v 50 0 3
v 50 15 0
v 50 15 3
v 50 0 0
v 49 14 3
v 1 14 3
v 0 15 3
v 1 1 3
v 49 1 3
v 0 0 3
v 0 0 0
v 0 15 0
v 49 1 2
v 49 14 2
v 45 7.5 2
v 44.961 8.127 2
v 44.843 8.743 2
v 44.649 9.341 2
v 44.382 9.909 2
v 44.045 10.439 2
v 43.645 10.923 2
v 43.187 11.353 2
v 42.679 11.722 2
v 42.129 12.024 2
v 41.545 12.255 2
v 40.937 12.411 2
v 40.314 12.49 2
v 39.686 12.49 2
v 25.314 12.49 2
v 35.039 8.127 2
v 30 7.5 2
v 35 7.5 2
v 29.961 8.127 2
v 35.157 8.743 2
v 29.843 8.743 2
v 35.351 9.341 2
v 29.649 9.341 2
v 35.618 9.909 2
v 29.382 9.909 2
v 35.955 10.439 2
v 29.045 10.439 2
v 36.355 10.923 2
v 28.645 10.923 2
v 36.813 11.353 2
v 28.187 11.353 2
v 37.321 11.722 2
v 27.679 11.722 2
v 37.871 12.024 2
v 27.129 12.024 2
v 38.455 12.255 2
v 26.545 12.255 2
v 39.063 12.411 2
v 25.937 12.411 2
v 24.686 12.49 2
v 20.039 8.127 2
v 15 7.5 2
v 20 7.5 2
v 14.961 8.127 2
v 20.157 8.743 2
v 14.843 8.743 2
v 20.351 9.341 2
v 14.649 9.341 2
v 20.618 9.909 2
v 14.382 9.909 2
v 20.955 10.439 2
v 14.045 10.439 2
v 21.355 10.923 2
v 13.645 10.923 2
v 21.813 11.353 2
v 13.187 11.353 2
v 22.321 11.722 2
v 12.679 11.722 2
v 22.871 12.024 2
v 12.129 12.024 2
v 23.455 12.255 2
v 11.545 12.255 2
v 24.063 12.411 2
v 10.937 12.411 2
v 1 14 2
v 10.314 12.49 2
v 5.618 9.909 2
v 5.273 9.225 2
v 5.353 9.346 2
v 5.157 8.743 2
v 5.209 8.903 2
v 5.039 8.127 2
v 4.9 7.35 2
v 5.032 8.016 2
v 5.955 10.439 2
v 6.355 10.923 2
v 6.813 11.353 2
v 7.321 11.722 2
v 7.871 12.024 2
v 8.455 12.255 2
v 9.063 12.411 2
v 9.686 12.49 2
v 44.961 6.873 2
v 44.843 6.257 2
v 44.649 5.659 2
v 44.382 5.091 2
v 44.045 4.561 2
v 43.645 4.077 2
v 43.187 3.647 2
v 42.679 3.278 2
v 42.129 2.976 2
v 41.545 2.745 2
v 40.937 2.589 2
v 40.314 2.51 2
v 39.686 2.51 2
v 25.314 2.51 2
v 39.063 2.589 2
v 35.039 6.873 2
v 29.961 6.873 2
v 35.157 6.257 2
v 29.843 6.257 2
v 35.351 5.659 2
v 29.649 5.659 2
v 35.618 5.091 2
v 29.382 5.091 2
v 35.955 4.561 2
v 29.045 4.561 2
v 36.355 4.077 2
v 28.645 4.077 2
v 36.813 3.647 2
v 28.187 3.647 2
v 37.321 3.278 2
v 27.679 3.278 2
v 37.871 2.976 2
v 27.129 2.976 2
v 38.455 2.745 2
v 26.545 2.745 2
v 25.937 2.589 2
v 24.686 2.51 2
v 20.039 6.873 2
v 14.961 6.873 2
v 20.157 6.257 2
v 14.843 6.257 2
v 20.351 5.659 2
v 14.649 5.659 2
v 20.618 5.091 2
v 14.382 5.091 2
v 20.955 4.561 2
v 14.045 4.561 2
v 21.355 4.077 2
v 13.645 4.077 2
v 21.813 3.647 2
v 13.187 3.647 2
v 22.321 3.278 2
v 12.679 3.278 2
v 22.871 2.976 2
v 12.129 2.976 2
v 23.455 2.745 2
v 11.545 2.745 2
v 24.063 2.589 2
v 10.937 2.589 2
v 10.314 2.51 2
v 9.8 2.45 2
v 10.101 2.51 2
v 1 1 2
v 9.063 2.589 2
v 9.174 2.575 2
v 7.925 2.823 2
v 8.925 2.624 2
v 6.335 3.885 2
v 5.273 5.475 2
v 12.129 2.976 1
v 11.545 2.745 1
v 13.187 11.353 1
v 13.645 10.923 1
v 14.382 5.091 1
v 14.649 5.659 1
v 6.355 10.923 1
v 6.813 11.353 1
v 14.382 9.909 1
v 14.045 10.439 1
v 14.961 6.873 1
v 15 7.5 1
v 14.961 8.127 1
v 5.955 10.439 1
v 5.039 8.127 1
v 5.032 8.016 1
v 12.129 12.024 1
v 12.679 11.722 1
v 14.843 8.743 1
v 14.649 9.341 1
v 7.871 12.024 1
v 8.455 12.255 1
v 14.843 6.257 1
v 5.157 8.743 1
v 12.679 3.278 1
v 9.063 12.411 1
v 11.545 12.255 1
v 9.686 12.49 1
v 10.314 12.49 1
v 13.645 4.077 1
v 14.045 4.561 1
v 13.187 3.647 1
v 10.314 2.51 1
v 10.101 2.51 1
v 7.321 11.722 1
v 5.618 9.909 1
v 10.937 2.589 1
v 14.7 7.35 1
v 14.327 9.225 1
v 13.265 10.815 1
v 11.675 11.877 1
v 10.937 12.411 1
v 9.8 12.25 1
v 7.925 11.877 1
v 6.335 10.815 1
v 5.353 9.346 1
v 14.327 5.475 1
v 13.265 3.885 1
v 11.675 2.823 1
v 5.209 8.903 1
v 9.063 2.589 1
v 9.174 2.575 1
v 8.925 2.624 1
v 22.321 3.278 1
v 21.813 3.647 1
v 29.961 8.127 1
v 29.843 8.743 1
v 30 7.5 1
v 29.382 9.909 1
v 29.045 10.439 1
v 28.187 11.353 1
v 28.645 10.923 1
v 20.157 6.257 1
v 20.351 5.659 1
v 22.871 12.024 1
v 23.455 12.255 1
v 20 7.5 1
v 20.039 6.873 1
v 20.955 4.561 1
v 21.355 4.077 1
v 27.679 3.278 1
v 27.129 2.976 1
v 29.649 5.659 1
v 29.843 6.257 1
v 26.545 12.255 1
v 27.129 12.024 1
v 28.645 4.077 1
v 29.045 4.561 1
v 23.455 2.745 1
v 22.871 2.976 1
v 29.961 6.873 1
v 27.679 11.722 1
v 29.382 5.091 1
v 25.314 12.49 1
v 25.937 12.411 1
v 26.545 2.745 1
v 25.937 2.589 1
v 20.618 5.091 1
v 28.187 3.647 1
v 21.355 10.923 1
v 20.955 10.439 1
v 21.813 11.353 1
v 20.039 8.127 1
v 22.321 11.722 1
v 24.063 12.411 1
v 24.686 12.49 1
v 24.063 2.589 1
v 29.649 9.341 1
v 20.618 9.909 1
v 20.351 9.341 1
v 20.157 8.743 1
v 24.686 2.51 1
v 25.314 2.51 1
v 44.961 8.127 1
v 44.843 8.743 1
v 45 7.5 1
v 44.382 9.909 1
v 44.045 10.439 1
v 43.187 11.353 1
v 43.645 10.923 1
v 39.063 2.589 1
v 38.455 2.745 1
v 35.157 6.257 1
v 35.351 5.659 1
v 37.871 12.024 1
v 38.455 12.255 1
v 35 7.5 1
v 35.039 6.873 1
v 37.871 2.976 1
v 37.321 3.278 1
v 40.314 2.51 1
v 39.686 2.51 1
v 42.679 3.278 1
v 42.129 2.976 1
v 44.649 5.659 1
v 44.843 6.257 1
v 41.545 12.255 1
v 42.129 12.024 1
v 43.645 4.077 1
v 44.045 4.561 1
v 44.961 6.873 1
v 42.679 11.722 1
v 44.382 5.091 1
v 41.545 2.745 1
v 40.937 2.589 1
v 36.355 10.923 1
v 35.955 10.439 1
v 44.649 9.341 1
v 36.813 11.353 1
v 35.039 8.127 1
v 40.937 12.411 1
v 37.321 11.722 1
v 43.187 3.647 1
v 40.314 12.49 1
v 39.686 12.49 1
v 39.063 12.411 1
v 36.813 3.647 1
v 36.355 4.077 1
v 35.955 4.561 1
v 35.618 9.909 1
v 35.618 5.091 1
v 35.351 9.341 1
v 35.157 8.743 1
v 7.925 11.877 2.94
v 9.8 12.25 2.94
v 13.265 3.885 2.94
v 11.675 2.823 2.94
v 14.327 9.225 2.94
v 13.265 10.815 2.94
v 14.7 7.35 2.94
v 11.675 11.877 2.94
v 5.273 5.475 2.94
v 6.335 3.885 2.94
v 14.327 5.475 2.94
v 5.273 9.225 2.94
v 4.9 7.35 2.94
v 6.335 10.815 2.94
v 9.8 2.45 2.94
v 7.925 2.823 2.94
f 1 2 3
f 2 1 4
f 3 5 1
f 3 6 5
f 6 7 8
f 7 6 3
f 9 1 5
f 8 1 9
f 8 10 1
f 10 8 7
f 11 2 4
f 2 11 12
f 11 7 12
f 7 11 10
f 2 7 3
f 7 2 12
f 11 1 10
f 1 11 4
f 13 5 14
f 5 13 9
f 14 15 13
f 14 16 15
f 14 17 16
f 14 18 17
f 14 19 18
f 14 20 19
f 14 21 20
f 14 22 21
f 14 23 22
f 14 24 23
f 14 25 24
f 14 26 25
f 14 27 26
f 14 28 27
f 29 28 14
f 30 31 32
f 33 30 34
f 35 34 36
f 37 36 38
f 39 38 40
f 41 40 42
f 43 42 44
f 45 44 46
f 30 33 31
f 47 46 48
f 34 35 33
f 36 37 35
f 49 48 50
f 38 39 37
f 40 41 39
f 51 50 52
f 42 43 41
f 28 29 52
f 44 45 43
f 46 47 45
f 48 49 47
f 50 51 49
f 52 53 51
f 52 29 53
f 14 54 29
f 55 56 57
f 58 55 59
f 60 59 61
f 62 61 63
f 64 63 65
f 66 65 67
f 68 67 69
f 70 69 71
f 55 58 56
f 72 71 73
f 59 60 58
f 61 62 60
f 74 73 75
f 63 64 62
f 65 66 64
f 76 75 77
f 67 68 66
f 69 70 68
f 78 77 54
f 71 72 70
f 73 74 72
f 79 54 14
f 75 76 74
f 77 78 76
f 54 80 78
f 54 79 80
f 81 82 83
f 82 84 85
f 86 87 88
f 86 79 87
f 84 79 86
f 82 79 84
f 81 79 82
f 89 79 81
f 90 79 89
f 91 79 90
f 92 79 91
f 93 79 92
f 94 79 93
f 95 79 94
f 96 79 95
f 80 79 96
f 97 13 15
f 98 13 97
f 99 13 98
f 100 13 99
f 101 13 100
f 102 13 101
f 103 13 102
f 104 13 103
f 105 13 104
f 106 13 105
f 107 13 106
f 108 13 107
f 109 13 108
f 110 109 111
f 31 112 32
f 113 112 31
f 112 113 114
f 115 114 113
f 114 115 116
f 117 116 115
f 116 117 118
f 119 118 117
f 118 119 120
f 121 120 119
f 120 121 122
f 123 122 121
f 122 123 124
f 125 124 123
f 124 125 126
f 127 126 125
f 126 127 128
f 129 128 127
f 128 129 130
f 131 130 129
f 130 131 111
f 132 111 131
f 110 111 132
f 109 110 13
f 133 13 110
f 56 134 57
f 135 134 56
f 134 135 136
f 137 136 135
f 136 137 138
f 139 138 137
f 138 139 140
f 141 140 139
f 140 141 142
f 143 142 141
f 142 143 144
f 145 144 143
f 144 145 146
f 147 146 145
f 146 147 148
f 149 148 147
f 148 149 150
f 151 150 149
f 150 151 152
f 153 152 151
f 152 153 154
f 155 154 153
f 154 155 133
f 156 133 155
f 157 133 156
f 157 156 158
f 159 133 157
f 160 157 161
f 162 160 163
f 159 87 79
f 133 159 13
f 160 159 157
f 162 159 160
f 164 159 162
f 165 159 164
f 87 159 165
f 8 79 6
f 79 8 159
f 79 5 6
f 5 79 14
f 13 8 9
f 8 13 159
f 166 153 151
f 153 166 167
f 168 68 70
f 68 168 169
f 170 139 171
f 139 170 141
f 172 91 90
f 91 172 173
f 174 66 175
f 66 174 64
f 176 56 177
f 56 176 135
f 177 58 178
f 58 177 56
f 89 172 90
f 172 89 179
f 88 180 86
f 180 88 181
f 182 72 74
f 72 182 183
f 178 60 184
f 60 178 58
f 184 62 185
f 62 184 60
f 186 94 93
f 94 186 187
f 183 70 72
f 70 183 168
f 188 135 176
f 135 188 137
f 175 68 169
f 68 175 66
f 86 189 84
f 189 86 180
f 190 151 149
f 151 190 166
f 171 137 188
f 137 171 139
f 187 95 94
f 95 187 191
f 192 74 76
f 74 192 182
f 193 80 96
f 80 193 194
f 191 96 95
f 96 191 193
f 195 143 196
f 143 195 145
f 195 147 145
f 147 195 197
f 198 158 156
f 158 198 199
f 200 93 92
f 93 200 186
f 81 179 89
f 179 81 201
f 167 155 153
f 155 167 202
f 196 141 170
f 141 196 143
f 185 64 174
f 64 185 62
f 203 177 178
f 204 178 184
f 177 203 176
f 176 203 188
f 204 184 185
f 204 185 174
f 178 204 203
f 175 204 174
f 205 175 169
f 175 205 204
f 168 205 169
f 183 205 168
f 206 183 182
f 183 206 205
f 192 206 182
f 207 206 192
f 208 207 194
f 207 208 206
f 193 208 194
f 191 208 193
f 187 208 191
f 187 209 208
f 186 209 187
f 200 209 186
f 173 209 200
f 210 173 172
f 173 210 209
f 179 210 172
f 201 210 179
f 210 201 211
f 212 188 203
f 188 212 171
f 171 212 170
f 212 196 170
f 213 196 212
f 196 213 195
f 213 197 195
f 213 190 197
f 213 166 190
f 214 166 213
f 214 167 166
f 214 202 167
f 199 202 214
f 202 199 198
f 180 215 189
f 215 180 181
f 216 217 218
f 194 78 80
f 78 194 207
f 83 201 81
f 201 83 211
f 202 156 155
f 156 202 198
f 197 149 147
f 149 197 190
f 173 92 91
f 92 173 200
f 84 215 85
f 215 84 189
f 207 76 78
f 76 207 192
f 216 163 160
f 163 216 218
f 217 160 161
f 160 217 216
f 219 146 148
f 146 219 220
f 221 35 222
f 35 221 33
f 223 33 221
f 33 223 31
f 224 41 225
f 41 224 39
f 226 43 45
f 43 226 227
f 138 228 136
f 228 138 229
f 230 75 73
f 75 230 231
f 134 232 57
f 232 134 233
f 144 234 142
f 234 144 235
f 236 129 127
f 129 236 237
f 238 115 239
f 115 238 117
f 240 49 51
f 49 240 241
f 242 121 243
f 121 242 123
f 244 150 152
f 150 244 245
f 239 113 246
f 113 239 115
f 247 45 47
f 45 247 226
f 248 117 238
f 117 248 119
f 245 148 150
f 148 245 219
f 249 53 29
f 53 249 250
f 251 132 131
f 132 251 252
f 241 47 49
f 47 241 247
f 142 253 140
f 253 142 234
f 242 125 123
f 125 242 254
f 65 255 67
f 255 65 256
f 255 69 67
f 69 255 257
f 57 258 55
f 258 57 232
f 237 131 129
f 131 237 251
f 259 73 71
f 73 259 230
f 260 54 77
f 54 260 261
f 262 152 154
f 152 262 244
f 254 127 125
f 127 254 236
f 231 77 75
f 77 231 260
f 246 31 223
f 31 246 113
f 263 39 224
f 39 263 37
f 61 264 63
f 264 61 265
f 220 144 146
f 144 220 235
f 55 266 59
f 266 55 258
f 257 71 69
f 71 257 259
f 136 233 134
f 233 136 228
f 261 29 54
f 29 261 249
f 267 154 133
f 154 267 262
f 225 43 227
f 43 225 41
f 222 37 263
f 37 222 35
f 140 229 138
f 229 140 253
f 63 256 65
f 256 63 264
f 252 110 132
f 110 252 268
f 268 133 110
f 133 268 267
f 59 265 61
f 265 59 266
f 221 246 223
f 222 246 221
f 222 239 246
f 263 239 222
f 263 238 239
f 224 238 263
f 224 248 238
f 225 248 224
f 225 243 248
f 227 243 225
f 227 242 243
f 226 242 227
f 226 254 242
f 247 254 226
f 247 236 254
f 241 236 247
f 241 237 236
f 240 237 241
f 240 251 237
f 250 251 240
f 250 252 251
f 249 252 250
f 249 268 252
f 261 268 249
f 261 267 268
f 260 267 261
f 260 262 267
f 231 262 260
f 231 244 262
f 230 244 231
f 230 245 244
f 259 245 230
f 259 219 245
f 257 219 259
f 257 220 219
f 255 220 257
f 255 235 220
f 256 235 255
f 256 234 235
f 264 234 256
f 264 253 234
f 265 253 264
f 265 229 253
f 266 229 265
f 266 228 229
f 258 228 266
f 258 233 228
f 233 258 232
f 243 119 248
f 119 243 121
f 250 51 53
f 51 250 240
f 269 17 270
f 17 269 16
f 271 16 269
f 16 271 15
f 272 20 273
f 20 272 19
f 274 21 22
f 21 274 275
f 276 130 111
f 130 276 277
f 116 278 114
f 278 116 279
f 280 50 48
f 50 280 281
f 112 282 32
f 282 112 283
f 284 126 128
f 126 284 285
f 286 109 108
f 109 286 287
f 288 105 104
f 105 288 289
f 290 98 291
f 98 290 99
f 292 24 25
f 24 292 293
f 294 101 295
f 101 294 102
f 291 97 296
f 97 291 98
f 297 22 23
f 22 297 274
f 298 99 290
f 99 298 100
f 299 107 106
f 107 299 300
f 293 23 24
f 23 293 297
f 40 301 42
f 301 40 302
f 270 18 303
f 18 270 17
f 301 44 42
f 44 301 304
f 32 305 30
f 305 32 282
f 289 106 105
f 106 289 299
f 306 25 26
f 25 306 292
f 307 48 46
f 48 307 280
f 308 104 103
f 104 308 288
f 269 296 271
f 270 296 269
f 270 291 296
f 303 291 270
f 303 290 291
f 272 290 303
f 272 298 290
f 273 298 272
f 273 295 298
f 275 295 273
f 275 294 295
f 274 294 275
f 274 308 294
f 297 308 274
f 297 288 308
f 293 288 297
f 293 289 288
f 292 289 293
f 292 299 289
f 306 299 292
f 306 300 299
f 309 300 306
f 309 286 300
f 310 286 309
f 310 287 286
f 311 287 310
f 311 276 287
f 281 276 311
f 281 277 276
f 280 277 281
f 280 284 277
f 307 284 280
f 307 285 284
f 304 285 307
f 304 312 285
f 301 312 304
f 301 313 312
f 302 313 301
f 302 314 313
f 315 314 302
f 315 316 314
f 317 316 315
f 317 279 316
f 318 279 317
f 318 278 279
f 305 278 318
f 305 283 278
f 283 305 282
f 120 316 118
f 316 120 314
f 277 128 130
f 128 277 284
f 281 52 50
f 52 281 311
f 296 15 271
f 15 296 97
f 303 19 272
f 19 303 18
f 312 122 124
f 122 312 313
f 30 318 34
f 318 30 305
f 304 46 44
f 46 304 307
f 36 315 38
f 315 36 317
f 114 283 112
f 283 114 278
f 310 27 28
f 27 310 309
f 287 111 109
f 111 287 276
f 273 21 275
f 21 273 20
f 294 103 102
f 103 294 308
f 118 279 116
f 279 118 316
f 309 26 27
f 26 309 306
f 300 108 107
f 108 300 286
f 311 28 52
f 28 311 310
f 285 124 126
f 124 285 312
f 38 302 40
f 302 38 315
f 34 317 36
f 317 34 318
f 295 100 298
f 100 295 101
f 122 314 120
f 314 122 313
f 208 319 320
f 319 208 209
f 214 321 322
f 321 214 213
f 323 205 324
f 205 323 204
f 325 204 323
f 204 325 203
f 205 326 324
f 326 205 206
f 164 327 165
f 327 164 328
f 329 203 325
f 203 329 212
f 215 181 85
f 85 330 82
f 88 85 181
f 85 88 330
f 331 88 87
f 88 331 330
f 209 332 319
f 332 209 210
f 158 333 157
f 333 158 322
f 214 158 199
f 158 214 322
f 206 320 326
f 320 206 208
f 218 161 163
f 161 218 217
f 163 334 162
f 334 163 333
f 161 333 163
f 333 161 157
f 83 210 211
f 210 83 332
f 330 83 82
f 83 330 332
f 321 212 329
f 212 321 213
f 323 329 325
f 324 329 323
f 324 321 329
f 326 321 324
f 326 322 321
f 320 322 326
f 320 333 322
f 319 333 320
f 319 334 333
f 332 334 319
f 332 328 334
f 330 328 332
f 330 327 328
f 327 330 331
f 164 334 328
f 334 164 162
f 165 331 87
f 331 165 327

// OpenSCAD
module abzeichen () {
    $fn = 50;
    offset= 10;
    rad=5;
    raum = 5;
    difference() {
        cube([50,15,3]);
        translate([1,1,2])
        cube([48,13,2]);
        translate([0*rad+offset+0*raum,7.5,1])
        cylinder(r=rad,h=3);
        translate([2*rad+offset+1*raum,7.5,1])
        cylinder(r=rad,h=3);
        translate([4*rad+offset+2*raum,7.5,1])
        cylinder(r=rad,h=3);
    }
};

module nippel() {
    offset= 10;
    rad=5;
    raum = 5;
    translate([0*rad+offset+0*raum,7.5,1])
    cylinder(r=rad,h=2);
};

abzeichen();



scale (0.98) nippel();
